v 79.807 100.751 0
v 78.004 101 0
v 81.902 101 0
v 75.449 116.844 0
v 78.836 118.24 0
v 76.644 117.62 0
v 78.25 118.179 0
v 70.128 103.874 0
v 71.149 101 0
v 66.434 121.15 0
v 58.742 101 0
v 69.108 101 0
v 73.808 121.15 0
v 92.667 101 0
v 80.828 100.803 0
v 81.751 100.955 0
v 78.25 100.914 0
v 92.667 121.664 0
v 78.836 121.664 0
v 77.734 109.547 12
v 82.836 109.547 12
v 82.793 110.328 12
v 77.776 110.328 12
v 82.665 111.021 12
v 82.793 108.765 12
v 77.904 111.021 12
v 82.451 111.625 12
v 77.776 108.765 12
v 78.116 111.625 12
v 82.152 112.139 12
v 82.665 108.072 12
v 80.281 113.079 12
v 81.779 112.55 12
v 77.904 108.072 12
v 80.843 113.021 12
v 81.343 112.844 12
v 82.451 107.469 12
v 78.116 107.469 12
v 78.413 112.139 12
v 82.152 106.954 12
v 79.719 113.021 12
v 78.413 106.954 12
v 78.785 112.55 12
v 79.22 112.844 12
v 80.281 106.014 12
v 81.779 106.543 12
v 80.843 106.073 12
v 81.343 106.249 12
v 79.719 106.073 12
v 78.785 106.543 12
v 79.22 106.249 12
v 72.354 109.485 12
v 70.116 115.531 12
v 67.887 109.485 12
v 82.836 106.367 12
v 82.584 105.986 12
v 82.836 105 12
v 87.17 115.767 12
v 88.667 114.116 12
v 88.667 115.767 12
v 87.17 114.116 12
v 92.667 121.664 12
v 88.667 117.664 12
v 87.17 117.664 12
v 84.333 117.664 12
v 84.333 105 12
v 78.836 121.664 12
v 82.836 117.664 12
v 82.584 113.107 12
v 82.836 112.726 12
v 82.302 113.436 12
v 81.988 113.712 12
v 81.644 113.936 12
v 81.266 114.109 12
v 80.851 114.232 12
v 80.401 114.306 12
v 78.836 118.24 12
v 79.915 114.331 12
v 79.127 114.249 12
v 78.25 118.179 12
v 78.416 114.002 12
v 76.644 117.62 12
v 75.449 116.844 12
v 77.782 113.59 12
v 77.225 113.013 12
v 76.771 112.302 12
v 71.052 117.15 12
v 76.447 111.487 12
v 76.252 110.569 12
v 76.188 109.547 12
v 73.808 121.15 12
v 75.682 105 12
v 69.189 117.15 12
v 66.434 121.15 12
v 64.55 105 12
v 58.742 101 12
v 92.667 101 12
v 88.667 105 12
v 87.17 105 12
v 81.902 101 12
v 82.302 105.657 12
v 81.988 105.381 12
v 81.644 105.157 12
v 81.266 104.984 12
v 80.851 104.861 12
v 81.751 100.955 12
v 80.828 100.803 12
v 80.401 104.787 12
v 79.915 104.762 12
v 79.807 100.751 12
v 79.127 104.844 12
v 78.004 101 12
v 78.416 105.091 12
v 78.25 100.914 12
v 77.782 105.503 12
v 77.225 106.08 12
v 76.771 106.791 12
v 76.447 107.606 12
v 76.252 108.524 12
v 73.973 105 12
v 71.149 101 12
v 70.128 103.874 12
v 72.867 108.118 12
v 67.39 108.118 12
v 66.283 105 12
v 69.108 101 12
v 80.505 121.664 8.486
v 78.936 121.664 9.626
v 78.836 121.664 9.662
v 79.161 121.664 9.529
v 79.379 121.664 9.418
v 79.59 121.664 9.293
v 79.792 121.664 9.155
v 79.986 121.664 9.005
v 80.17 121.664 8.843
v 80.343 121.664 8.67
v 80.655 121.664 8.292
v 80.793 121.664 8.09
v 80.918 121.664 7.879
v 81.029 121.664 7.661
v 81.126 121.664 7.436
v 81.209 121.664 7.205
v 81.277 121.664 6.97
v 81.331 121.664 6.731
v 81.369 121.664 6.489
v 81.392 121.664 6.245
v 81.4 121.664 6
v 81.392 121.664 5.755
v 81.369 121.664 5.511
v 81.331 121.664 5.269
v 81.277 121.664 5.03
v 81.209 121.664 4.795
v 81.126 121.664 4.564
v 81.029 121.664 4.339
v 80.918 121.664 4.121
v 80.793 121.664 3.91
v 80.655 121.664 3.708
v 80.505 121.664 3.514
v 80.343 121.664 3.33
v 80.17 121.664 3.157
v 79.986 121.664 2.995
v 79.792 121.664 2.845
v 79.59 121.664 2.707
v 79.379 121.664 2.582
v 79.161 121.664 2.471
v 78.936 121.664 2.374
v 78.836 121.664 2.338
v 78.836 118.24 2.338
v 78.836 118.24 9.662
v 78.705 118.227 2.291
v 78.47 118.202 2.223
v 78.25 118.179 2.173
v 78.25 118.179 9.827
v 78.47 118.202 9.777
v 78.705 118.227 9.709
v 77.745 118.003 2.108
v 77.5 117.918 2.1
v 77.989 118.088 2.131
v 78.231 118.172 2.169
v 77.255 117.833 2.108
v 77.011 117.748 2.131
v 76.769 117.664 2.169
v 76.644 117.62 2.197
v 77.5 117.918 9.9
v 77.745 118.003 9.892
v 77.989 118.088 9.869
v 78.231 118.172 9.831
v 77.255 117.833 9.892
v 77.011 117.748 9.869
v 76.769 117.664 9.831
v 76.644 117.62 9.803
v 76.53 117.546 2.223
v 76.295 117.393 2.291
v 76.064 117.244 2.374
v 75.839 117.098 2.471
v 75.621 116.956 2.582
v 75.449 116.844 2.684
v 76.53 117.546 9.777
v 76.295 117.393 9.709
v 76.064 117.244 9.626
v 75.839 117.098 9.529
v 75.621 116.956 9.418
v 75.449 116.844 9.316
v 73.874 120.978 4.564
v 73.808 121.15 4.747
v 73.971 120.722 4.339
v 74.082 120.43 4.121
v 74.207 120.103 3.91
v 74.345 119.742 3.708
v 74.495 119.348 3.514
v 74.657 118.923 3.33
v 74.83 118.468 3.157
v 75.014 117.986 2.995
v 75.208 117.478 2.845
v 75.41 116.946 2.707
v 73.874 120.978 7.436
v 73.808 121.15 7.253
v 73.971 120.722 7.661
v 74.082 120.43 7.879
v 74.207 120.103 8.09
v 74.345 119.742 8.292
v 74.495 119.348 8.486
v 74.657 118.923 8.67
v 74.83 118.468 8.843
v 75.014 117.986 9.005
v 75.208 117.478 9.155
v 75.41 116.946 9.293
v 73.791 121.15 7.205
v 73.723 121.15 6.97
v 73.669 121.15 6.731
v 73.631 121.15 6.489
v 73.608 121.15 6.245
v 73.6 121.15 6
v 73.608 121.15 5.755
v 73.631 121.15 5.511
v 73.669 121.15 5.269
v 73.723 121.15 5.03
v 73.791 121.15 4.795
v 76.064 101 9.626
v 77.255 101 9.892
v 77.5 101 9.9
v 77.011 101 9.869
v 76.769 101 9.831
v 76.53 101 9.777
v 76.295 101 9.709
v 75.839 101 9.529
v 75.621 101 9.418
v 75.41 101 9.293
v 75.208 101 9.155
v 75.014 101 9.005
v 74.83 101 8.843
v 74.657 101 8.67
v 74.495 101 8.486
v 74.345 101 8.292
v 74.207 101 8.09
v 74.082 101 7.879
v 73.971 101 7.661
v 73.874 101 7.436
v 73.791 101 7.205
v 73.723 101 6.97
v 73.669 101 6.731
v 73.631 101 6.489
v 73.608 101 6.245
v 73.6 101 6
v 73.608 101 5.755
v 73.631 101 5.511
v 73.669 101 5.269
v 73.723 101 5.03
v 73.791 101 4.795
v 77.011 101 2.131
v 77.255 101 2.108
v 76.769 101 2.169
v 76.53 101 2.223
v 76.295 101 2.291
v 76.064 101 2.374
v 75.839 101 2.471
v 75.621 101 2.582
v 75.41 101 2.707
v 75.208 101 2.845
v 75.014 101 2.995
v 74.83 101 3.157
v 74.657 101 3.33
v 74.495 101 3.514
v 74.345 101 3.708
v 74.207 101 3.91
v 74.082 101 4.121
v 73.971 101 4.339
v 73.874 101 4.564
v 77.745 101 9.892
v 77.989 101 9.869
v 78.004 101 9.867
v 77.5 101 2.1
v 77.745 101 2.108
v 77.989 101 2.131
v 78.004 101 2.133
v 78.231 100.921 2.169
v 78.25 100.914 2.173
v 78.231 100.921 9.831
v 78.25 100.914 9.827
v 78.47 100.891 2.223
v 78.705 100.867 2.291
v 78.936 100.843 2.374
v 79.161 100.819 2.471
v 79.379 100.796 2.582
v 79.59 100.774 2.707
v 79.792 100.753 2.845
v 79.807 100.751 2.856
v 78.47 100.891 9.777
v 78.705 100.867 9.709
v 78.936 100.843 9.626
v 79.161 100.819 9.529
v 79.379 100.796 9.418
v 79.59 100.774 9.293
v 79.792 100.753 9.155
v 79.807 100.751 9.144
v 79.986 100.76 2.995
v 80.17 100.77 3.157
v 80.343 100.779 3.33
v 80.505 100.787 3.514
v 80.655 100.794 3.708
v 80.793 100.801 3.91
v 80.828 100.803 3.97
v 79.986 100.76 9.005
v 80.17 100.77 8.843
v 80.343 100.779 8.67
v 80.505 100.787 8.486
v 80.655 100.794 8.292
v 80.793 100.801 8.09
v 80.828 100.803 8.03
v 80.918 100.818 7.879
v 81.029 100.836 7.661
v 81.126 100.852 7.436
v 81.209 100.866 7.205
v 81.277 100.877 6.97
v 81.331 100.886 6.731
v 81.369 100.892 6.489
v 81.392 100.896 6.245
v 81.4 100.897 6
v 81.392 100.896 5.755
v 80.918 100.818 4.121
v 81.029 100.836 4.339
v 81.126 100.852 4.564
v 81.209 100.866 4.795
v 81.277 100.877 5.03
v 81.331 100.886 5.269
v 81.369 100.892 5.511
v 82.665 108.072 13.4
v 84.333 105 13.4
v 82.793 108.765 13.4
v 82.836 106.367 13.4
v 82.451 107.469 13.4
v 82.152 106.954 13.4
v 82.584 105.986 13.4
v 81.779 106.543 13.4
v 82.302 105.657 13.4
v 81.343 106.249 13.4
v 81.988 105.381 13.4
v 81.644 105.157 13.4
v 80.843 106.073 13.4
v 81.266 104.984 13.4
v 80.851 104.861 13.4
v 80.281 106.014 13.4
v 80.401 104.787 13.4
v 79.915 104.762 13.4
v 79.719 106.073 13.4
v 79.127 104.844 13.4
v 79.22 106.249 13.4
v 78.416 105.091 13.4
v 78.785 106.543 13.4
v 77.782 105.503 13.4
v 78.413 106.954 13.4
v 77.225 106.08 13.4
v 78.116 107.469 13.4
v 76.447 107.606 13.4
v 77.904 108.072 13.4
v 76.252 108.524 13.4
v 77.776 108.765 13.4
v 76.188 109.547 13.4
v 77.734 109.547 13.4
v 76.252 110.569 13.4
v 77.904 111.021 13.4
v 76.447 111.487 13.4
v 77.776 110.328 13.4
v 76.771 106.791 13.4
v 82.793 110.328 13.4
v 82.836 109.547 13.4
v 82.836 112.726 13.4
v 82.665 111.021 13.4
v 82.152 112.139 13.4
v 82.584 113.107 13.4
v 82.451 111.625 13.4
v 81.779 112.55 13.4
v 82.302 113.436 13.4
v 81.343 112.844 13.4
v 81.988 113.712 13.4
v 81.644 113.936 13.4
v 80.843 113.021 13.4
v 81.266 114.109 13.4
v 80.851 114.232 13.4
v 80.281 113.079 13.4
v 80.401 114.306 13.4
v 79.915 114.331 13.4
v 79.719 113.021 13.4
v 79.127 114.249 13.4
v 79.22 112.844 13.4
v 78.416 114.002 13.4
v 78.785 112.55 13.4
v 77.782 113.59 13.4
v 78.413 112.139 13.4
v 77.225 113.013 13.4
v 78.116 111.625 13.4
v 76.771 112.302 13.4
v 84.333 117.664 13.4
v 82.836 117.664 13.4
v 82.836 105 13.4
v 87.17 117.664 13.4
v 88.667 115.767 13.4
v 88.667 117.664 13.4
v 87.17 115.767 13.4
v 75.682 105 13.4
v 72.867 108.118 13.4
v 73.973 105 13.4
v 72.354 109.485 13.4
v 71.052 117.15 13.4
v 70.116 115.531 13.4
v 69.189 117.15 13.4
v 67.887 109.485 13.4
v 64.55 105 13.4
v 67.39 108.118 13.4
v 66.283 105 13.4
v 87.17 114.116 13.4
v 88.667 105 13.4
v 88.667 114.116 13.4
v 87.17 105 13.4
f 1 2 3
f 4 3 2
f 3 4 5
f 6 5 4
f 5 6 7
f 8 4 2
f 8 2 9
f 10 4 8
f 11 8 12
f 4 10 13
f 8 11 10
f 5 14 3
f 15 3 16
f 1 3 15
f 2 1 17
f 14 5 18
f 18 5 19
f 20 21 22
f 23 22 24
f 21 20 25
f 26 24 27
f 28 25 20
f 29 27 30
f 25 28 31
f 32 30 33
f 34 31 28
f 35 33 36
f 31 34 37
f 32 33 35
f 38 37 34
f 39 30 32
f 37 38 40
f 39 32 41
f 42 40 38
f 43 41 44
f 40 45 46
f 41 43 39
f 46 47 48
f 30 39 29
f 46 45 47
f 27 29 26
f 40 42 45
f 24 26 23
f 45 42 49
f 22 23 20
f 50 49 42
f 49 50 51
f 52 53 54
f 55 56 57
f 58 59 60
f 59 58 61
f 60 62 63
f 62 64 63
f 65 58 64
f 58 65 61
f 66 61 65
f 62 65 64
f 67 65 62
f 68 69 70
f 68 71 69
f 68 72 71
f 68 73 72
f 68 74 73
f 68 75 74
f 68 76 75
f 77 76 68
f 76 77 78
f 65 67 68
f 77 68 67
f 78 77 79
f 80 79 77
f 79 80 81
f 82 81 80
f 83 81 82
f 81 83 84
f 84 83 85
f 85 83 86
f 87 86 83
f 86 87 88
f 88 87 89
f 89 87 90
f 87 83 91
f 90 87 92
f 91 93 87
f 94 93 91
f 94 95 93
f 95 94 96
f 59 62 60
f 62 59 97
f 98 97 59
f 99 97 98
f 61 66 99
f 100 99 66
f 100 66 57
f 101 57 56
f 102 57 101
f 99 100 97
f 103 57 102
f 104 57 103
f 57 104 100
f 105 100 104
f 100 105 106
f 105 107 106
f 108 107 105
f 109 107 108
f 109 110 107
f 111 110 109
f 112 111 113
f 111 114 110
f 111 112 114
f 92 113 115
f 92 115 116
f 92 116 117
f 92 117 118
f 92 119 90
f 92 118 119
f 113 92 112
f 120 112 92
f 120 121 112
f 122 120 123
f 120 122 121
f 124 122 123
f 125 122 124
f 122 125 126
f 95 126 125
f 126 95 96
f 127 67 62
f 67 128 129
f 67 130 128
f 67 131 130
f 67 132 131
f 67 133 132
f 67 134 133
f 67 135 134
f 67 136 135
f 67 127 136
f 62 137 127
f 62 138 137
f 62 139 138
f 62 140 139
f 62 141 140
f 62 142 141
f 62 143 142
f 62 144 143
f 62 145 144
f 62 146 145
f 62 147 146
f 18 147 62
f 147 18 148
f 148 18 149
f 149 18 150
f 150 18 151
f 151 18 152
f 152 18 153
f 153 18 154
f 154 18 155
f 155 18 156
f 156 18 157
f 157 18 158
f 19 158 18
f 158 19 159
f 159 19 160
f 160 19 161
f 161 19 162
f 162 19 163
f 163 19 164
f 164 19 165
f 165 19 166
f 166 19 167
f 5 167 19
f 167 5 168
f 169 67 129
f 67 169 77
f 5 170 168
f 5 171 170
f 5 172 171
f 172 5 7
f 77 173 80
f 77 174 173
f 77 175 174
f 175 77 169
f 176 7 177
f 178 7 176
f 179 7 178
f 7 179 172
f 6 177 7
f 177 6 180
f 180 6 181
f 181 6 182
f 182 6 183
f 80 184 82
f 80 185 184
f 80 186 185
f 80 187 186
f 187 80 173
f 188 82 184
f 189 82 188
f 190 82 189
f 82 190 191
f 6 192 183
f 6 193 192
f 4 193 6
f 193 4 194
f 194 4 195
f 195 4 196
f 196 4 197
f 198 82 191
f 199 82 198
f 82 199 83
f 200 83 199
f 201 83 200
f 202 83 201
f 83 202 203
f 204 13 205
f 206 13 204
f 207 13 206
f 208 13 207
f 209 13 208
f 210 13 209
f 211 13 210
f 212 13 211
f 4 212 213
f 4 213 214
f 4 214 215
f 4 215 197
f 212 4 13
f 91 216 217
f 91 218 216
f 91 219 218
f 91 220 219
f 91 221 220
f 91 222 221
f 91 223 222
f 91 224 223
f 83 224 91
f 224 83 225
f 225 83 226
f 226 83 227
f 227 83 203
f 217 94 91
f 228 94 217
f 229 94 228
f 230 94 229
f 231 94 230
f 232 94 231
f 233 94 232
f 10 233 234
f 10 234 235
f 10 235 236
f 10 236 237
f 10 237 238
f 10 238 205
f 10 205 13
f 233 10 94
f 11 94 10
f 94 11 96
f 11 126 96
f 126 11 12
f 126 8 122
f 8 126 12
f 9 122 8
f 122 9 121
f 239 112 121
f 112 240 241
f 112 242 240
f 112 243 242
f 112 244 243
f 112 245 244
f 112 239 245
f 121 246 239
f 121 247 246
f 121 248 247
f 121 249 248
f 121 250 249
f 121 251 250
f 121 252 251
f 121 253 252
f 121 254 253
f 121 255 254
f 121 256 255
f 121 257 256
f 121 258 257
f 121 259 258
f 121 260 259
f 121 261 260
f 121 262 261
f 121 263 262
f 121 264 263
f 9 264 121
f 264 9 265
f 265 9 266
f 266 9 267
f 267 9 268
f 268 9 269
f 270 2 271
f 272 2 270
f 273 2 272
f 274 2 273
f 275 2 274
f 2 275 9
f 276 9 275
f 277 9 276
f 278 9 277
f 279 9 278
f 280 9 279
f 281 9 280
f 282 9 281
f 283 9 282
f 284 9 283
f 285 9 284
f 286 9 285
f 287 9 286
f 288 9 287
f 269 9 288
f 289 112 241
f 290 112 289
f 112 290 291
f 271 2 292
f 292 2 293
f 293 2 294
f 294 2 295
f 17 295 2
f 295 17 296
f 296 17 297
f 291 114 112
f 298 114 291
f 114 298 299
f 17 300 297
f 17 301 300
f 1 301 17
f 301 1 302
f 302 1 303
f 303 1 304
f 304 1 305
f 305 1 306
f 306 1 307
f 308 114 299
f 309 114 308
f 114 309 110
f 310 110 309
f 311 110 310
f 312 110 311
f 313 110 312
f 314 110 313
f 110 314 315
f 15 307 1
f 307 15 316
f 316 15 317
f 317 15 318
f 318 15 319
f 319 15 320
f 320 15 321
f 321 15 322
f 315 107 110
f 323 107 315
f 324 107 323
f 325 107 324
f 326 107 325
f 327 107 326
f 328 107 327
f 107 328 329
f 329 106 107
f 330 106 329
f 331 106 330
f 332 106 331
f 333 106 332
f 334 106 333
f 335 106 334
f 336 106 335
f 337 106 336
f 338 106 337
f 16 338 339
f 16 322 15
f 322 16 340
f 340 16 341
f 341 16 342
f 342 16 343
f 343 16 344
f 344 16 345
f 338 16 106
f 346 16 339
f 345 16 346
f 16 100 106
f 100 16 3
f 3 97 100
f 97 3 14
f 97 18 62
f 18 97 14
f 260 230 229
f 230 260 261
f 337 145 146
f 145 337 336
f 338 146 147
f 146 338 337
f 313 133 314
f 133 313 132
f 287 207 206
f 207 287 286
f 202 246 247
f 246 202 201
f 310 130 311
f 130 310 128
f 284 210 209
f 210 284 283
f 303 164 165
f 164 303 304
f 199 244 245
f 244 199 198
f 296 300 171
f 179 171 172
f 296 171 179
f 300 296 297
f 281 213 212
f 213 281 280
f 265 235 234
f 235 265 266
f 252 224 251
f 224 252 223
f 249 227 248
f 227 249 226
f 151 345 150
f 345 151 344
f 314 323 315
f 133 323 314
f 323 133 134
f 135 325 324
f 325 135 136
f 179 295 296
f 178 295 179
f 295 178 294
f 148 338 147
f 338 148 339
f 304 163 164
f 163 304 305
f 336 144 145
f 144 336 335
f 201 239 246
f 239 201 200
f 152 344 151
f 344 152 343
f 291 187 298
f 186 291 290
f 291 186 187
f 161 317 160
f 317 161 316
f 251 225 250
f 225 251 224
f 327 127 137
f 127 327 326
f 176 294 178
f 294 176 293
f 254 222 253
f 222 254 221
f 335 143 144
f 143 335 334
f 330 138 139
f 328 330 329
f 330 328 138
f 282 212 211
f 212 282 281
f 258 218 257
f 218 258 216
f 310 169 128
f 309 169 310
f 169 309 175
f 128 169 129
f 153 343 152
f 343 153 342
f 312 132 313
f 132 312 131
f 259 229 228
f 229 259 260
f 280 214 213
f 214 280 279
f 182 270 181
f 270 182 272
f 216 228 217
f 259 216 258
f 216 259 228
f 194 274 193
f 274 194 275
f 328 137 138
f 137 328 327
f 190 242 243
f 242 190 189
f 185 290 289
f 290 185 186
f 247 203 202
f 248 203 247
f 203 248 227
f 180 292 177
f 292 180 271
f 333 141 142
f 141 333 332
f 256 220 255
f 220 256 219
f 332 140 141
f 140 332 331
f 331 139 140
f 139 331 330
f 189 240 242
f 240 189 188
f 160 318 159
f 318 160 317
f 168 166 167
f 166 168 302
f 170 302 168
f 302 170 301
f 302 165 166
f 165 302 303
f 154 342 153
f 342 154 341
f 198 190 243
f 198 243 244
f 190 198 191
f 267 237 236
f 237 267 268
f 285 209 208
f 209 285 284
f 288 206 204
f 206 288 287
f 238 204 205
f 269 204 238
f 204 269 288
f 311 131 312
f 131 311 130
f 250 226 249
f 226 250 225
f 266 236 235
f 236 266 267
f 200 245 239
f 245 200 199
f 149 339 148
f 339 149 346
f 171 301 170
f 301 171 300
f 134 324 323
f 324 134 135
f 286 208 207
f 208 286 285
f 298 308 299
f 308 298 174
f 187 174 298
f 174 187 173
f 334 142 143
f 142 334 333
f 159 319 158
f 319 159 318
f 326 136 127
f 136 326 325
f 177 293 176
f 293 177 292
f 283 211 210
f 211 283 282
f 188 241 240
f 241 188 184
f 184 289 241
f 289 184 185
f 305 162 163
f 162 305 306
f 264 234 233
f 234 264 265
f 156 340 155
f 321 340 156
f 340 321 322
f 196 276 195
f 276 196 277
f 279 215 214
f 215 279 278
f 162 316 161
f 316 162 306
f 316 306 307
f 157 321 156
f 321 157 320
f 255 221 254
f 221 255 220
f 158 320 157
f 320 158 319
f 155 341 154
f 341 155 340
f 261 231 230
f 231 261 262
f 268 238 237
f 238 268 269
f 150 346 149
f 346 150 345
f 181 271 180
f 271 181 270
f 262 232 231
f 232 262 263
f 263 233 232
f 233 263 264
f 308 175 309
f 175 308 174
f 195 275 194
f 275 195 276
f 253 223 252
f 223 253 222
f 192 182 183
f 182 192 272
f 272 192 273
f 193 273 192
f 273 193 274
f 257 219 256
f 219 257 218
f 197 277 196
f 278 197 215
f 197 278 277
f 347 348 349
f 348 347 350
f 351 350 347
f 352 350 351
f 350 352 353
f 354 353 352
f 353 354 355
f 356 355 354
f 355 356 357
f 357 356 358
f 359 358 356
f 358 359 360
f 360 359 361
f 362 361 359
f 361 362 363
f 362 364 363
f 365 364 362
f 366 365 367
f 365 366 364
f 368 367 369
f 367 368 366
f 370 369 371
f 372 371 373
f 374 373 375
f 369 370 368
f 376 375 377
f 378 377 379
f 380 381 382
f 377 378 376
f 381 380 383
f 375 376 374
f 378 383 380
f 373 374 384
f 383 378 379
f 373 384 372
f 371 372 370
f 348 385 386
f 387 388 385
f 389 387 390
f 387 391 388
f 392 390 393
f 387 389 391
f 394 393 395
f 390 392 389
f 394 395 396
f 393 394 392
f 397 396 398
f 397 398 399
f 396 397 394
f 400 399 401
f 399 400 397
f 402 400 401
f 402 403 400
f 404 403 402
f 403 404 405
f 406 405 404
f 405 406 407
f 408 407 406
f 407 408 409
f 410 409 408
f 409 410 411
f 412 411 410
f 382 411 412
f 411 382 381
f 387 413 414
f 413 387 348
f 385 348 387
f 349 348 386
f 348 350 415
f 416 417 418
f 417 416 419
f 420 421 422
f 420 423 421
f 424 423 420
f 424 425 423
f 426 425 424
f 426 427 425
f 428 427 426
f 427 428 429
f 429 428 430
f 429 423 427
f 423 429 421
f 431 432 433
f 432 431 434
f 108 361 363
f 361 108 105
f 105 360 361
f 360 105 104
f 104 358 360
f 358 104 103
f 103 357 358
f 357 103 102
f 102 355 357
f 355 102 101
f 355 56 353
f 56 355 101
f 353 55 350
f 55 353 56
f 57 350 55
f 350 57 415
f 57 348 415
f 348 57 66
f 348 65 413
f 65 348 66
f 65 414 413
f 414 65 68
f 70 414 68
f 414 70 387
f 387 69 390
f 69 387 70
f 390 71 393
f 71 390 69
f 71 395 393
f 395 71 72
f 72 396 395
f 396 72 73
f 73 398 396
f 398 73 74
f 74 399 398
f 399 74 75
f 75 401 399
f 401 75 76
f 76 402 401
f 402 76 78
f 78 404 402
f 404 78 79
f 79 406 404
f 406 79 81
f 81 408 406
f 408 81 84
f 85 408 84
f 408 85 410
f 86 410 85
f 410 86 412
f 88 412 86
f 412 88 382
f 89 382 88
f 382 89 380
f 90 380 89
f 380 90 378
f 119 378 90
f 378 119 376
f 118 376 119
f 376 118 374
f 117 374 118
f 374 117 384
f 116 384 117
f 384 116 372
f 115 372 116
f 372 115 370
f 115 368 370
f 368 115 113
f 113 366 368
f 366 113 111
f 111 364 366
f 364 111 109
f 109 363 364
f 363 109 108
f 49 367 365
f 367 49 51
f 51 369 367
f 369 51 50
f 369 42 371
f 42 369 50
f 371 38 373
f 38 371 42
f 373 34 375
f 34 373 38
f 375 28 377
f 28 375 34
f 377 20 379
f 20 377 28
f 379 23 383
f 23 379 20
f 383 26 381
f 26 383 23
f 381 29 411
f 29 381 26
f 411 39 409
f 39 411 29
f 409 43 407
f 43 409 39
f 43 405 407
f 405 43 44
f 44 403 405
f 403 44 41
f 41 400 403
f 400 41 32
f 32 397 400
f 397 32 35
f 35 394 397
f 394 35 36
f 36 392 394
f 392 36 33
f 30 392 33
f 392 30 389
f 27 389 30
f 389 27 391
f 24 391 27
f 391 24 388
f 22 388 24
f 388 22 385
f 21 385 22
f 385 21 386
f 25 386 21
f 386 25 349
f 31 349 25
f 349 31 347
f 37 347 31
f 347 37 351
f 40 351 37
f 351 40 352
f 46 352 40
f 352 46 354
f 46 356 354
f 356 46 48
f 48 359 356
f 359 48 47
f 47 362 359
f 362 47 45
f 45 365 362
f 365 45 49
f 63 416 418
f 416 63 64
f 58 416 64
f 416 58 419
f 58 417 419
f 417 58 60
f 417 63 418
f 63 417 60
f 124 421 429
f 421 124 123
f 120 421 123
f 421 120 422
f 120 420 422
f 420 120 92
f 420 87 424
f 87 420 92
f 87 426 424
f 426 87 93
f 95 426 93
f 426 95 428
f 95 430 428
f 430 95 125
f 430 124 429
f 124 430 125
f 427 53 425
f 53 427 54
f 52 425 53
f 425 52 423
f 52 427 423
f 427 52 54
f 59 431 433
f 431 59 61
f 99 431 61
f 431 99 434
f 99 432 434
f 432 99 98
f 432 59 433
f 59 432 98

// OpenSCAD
/* =====================================================
   Multi-Name Topper (FIX PERFECT CENTER)
   ===================================================== */

grid_cols = 2;
/* [Nama] */
/* [Nama] */
nama_1  = "Adi";
nama_1_icon = "None"; // ["None", "Anchor", "Heart", "Star", "Crown", "Paw", "Music", "Cat", "Moon", "Sun", "Flower", "Diamond", "Butterfly", "Ribbon", "Smile"]

nama_2  = "";
nama_2_icon = "None"; // ["None", "Anchor", "Heart", "Star", "Crown", "Paw", "Music", "Cat", "Moon", "Sun", "Flower", "Diamond", "Butterfly", "Ribbon", "Smile"]

nama_3  = "";
nama_3_icon = "None"; // ["None", "Anchor", "Heart", "Star", "Crown", "Paw", "Music", "Cat", "Moon", "Sun", "Flower", "Diamond", "Butterfly", "Ribbon", "Smile"]

nama_4  = "";
nama_4_icon = "None"; // ["None", "Anchor", "Heart", "Star", "Crown", "Paw", "Music", "Cat", "Moon", "Sun", "Flower", "Diamond", "Butterfly", "Ribbon", "Smile"]

nama_5  = "";
nama_5_icon = "None"; // ["None", "Anchor", "Heart", "Star", "Crown", "Paw", "Music", "Cat", "Moon", "Sun", "Flower", "Diamond", "Butterfly", "Ribbon", "Smile"]

nama_6  = "";
nama_6_icon = "None"; // ["None", "Anchor", "Heart", "Star", "Crown", "Paw", "Music", "Cat", "Moon", "Sun", "Flower", "Diamond", "Butterfly", "Ribbon", "Smile"]

nama_7  = "";
nama_7_icon = "None"; // ["None", "Anchor", "Heart", "Star", "Crown", "Paw", "Music", "Cat", "Moon", "Sun", "Flower", "Diamond", "Butterfly", "Ribbon", "Smile"]

nama_8  = "";
nama_8_icon = "None"; // ["None", "Anchor", "Heart", "Star", "Crown", "Paw", "Music", "Cat", "Moon", "Sun", "Flower", "Diamond", "Butterfly", "Ribbon", "Smile"]

nama_9  = "";
nama_9_icon = "None"; // ["None", "Anchor", "Heart", "Star", "Crown", "Paw", "Music", "Cat", "Moon", "Sun", "Flower", "Diamond", "Butterfly", "Ribbon", "Smile"]

nama_10 = "";
nama_10_icon = "None"; // ["None", "Anchor", "Heart", "Star", "Crown", "Paw", "Music", "Cat", "Moon", "Sun", "Flower", "Diamond", "Butterfly", "Ribbon", "Smile"]

/* [Warna] */ 
base_color_name = "Peak Green"; // [Yellow, White, Sky Blue, Red, Peak Green, Orange, Grape Purple, Black, Beige, Barbie Pink] 
letters_color_name = "White"; // [Yellow, White, Sky Blue, Red, Peak Green, Orange, Grape Purple, Black, Beige, Barbie Pink]

/* [Settings] */
font_name        = "Bagel Fat One"; // font [Bagel Fat One, Chewy, Courgette, Dancing Script, Lemon, Lobster, Pacifico, Playfair, Lily Script One, Sacramento, Bubblegum Sans, DynaPuff, Alkatra, Archivo, Sour Gummy, Shrikhand]
letter_height    = 12;
letter_thickness = 1.4;
base_height      = 12;
outline_margin   = 4;

hole_orientation = "TOPBOTTOM";
hole_diameter    = 7.8;
hole_length      = 200;

hole_y = 4;
hole_z = base_height / 2;

/* [Layout Grid] */
bed_x = 235;
bed_y = 235;

gap_x = 10;
gap_y = 10;

slot_w = 70;
slot_h = 25;

/* ===============================
   COLOR
   =============================== */
function getColor(name) =
    name == "Yellow"       ? "#FFD700" :
    name == "White"        ? "#FFFFFF" :
    name == "Sky Blue"     ? "#87CEEB" :
    name == "Red"          ? "#FF0000" :
    name == "Peak Green"   ? "#00C853" :
    name == "Orange"       ? "#FF6A00" :
    name == "Grape Purple" ? "#6A0DAD" :
    name == "Black"        ? "#000000" :
    name == "Beige"        ? "#D9B99b" :
    name == "Barbie Pink"  ? "#FF69B4" :
    "#FFFFFF";

base_color    = getColor(base_color_name);
letters_color = getColor(letters_color_name);

// ─────────────────────────────────────────────
// VECTOR 2D ICONS (100% CGAL Safe untuk MakerWorld)
// ─────────────────────────────────────────────
module icon_anchor(h = 10) {
    s = h / 12;
    scale([s, s]) {
        translate([0, 1]) {
            difference() {
                translate([0, 9.5]) circle(r = 2.2, $fn=24);
                translate([0, 9.5]) circle(r = 1.0, $fn=24);
            }
            translate([-0.8, 1]) square([1.6, 7.5]);
            translate([-3, 6]) square([6, 1.3]);
            difference() {
                translate([0, 3.5]) circle(r = 4.5, $fn=24);
                translate([0, 3.5]) circle(r = 2.9, $fn=24);
                translate([-6, 3.5]) square([12, 6]);
            }
            hull() {
                translate([-4.5, 3.5]) circle(r = 0.8, $fn=16);
                translate([-5.5, 5.2]) circle(r = 0.3, $fn=16);
                translate([-3.2, 3.5]) circle(r = 0.8, $fn=16);
            }
            hull() {
                translate([4.5, 3.5]) circle(r = 0.8, $fn=16);
                translate([5.5, 5.2]) circle(r = 0.3, $fn=16);
                translate([3.2, 3.5]) circle(r = 0.8, $fn=16);
            }
        }
    }
}

module icon_heart(h = 10) {
    s = h / 9.5;
    scale([s, s]) {
        translate([0, 0.5]) {
            hull() {
                translate([-2.5, 6.5]) circle(r = 2.5, $fn=24);
                translate([0, 1.2]) circle(r = 0.6, $fn=16);
            }
            hull() {
                translate([2.5, 6.5]) circle(r = 2.5, $fn=24);
                translate([0, 1.2]) circle(r = 0.6, $fn=16);
            }
        }
    }
}

module icon_star(h = 10) {
    r_out = h / 2;
    r_in  = r_out * 0.42;
    translate([0, r_out]) {
        for (i = [0:4]) {
            hull() {
                circle(r = r_in, $fn=16);
                rotate([0, 0, i * 72 + 90]) translate([r_out, 0]) circle(r = 0.5, $fn=12);
            }
        }
    }
}

module icon_crown(h = 10) {
    s = h / 10;
    scale([s, s]) {
        translate([0, 0.5]) {
            hull() {
                translate([-4.5, 0]) square([9, 1.5]);
                translate([0, 7.5]) circle(r = 0.8, $fn=16);
            }
            hull() {
                translate([-4.5, 0]) square([9, 1.5]);
                translate([-4.2, 6.5]) circle(r = 0.8, $fn=16);
            }
            hull() {
                translate([-4.5, 0]) square([9, 1.5]);
                translate([4.2, 6.5]) circle(r = 0.8, $fn=16);
            }
        }
    }
}

module icon_paw(h = 10) {
    s = h / 12;
    scale([s, s]) {
        translate([0, 1]) {
            hull() {
                translate([0, 3.5]) circle(r = 2.8, $fn=24);
                translate([-2, 2]) circle(r = 1.6, $fn=20);
                translate([2, 2]) circle(r = 1.6, $fn=20);
            }
            translate([-3.3, 7.5]) circle(r = 1.0, $fn=16);
            translate([-1.3, 9.2]) circle(r = 1.1, $fn=16);
            translate([1.3, 9.2]) circle(r = 1.1, $fn=16);
            translate([3.3, 7.5]) circle(r = 1.0, $fn=16);
        }
    }
}

module icon_music(h = 10) {
    s = h / 12;
    scale([s, s]) {
        translate([0, 1]) {
            rotate([0, 0, -20]) translate([-2.5, 2]) scale([1.3, 0.9]) circle(r = 1.6, $fn=20);
            rotate([0, 0, -20]) translate([1.8, 4]) scale([1.3, 0.9]) circle(r = 1.6, $fn=20);
            translate([-1.5, 2]) square([1.0, 7.5]);
            translate([2.8, 4]) square([1.0, 7.5]);
            hull() {
                translate([-1.5, 8.5]) square([5.3, 1.2]);
                translate([-1.5, 7.5]) square([5.3, 0.5]);
            }
        }
    }
}

module icon_cat(h = 10) {
    s = h / 12;
    scale([s, s]) {
        translate([0, 1]) {
            translate([0, 4.5]) circle(r = 3.8, $fn=24);
            hull() {
                translate([-3.2, 6]) circle(r = 1.0, $fn=16);
                translate([-3.5, 9.2]) circle(r = 0.3, $fn=12);
                translate([-1.2, 7.2]) circle(r = 0.8, $fn=16);
            }
            hull() {
                translate([3.2, 6]) circle(r = 1.0, $fn=16);
                translate([3.5, 9.2]) circle(r = 0.3, $fn=12);
                translate([1.2, 7.2]) circle(r = 0.8, $fn=16);
            }
        }
    }
}

module icon_moon(h = 10) {
    s = h / 12;
    scale([s, s]) {
        translate([0, 1]) {
            difference() {
                translate([0, 5]) circle(r = 4.5, $fn=32);
                translate([2.2, 5.5]) circle(r = 4.0, $fn=32);
            }
        }
    }
}

module icon_sun(h = 10) {
    s = h / 12;
    scale([s, s]) {
        translate([0, 6]) {
            circle(r = 2.5, $fn=24);
            for (a = [0:45:315]) {
                rotate([0, 0, a])
                    hull() {
                        translate([3.2, 0]) circle(r = 0.5, $fn=12);
                        translate([4.6, 0]) circle(r = 0.2, $fn=8);
                    }
            }
        }
    }
}

module icon_flower(h = 10) {
    s = h / 12;
    scale([s, s]) {
        translate([0, 6]) {
            circle(r = 1.5, $fn=20);
            for (a = [0:72:288]) {
                rotate([0, 0, a])
                    translate([2.5, 0]) circle(r = 1.6, $fn=20);
            }
        }
    }
}

module icon_diamond(h = 10) {
    s = h / 12;
    scale([s, s]) {
        translate([0, 1]) {
            hull() {
                translate([-4, 6]) square([8, 2]);
                translate([0, 0.5]) circle(r = 0.5, $fn=16);
            }
            hull() {
                translate([-4, 6]) square([8, 2]);
                translate([-2.5, 9.5]) square([5, 0.5]);
            }
        }
    }
}

module icon_butterfly(h = 10) {
    s = h / 12;
    scale([s, s]) {
        translate([0, 1]) {
            hull() {
                translate([0, 7]) circle(r = 0.8, $fn=16);
                translate([0, 2]) circle(r = 0.5, $fn=16);
            }
            hull() {
                translate([-2.8, 6.8]) circle(r = 2.2, $fn=20);
                translate([0, 5]) circle(r = 0.8, $fn=16);
            }
            hull() {
                translate([2.8, 6.8]) circle(r = 2.2, $fn=20);
                translate([0, 5]) circle(r = 0.8, $fn=16);
            }
            hull() {
                translate([-2.2, 3.2]) circle(r = 1.6, $fn=20);
                translate([0, 4]) circle(r = 0.6, $fn=16);
            }
            hull() {
                translate([2.2, 3.2]) circle(r = 1.6, $fn=20);
                translate([0, 4]) circle(r = 0.6, $fn=16);
            }
        }
    }
}

module icon_ribbon(h = 10) {
    s = h / 12;
    scale([s, s]) {
        translate([0, 1]) {
            translate([0, 5.5]) circle(r = 1.2, $fn=20);
            hull() {
                translate([0, 5.5]) circle(r = 0.8, $fn=16);
                translate([-3.8, 6.8]) circle(r = 1.8, $fn=20);
                translate([-3.8, 4.2]) circle(r = 1.6, $fn=20);
            }
            hull() {
                translate([0, 5.5]) circle(r = 0.8, $fn=16);
                translate([3.8, 6.8]) circle(r = 1.8, $fn=20);
                translate([3.8, 4.2]) circle(r = 1.6, $fn=20);
            }
            hull() {
                translate([0, 5]) circle(r = 0.6, $fn=12);
                translate([-2.8, 1.2]) circle(r = 0.6, $fn=12);
            }
            hull() {
                translate([0, 5]) circle(r = 0.6, $fn=12);
                translate([2.8, 1.2]) circle(r = 0.6, $fn=12);
            }
        }
    }
}

module icon_smile(h = 10) {
    s = h / 12;
    scale([s, s]) {
        translate([0, 1]) {
            difference() {
                translate([0, 5]) circle(r = 4.5, $fn=32);
                translate([0, 5]) circle(r = 3.2, $fn=32);
            }
            translate([-1.8, 6.2]) circle(r = 0.7, $fn=16);
            translate([1.8, 6.2]) circle(r = 0.7, $fn=16);
            difference() {
                translate([0, 4.8]) circle(r = 2.2, $fn=24);
                translate([0, 4.8]) circle(r = 1.4, $fn=24);
                translate([-3, 4.8]) square([6, 3]);
            }
        }
    }
}

module draw_icon(name, size = 10) {
    if (name == "Anchor") {
        translate([size * 0.4, 0, 0]) icon_anchor(size);
    } else if (name == "Heart") {
        translate([size * 0.44, 0, 0]) icon_heart(size);
    } else if (name == "Star") {
        translate([size * 0.4, 0, 0]) icon_star(size);
    } else if (name == "Crown") {
        translate([size * 0.4, 0, 0]) icon_crown(size);
    } else if (name == "Paw") {
        translate([size * 0.4, 0, 0]) icon_paw(size);
    } else if (name == "Music") {
        translate([size * 0.4, 0, 0]) icon_music(size);
    } else if (name == "Cat") {
        translate([size * 0.4, 0, 0]) icon_cat(size);
    } else if (name == "Moon") {
        translate([size * 0.4, 0, 0]) icon_moon(size);
    } else if (name == "Sun") {
        translate([size * 0.4, 0, 0]) icon_sun(size);
    } else if (name == "Flower") {
        translate([size * 0.4, 0, 0]) icon_flower(size);
    } else if (name == "Diamond") {
        translate([size * 0.4, 0, 0]) icon_diamond(size);
    } else if (name == "Butterfly") {
        translate([size * 0.4, 0, 0]) icon_butterfly(size);
    } else if (name == "Ribbon") {
        translate([size * 0.4, 0, 0]) icon_ribbon(size);
    } else if (name == "Smile") {
        translate([size * 0.4, 0, 0]) icon_smile(size);
    }
}

// ─────────────────────────────────────────────
// EMOJI CLEANER & AUTO DETECT
// ─────────────────────────────────────────────
function is_printable_ascii(c) = (ord(c) >= 32 && ord(c) <= 126) || ord(c) == 194 || ord(c) == 176 || ord(c) == 177;

function str_join(arr, idx=0) = 
    idx >= len(arr) ? "" :
    str(arr[idx], str_join(arr, idx+1));

function clean_text(str_val) = 
    len(str_val) == 0 ? "" :
    str_join([for (i = [0:len(str_val)-1]) if (is_printable_ascii(str_val[i])) str_val[i]]);

function has_emoji_or_symbol(str_val) =
    len(str_val) == 0 ? false :
    len([for (i = [0:len(str_val)-1]) if (!is_printable_ascii(str_val[i])) 1]) > 0;

function resolve_icon(word, select_icon) =
    select_icon != "None" ? select_icon :
    has_emoji_or_symbol(word) ? "Anchor" :
    "None";

function char_w_val(c) =
    c=="A" ? 0.96 : c=="B" ? 0.80 : c=="C" ? 0.84 :
    c=="D" ? 0.84 : c=="E" ? 0.86 : c=="F" ? 0.76 :
    c=="G" ? 0.96 : c=="H" ? 0.93 : c=="I" ? 0.4  :
    c=="J" ? 0.76 : c=="K" ? 0.92 : c=="L" ? 0.74 :
    c=="M" ? 1.20 : c=="N" ? 0.98 : c=="O" ? 0.90 :
    c=="P" ? 0.88 : c=="Q" ? 0.90 : c=="R" ? 0.92 :
    c=="S" ? 0.90 : c=="T" ? 0.74 : c=="U" ? 0.86 :
    c=="V" ? 0.84 : c=="W" ? 1.14 : c=="X" ? 0.80 :
    c=="Y" ? 0.78 : c=="Z" ? 0.78 :
    c=="a" ? 0.85 : c=="b" ? 0.79 : c=="c" ? 0.74 :
    c=="d" ? 0.84 : c=="e" ? 0.76 : c=="f" ? 0.54 :
    c=="g" ? 0.76 : c=="h" ? 0.78 : c=="i" ? 0.38 :
    c=="j" ? 0.44 : c=="k" ? 0.84 : c=="l" ? 0.38 :
    c=="m" ? 1.08 : c=="n" ? 0.78 : c=="o" ? 0.78 :
    c=="p" ? 0.76 : c=="q" ? 0.86 : c=="r" ? 0.70 :
    c=="s" ? 0.76 : c=="t" ? 0.70 : c=="u" ? 0.84 :
    c=="v" ? 0.74 : c=="w" ? 1.14 : c=="x" ? 0.70 :
    c=="y" ? 0.74 : c=="z" ? 0.80 :
    c=="." ? 0.10 : ord(c)==194 ? 0.18 : ord(c)==176 ? 0.18 :
    c==" " ? 0.50 : 0.76;

function sum_char_w(str_val, idx=0) =
    idx >= len(str_val) ? 0 :
    char_w_val(str_val[idx]) + sum_char_w(str_val, idx+1);

function get_raw_word_width(word) =
    let(cleaned = clean_text(word))
    sum_char_w(cleaned) * letter_height;

module render_text_and_icon(text_string, icon_name = "None") {
    effective_icon = resolve_icon(text_string, icon_name);
    cleaned = clean_text(text_string);
    word_w  = get_raw_word_width(text_string);
    icon_w  = (effective_icon != "None") ? letter_height * 0.9 : 0;
    total_w = word_w + (icon_w > 0 ? icon_w + 2 : 0);

    translate([-total_w / 2, 0, 0]) {
        if (cleaned != "") {
            text(
                cleaned,
                size   = letter_height,
                font   = font_name,
                valign = "baseline"
            );
        }
        if (effective_icon != "None") {
            translate([word_w, 0, 0])
                draw_icon(effective_icon, size = letter_height * 0.9);
        }
    }
}

/* ===============================
   MODULES (CENTER FIX)
   =============================== */
module base_with_tunnel(text_string, icon_name = "None") {

    difference() {
        linear_extrude(height = base_height)
            offset(delta = outline_margin)
                render_text_and_icon(text_string, icon_name);

        if (hole_orientation == "TOPBOTTOM") {
            translate([ 0, 0, hole_z ])
                rotate([ 90, 0, 0 ])
                    cylinder(d = hole_diameter, h = hole_length, center = true, $fn = 100);
        }
        else if (hole_orientation == "FRONTBACK") {
            translate([ 0, hole_y, hole_z ])
                rotate([ 0, 90, 0 ])
                    cylinder(d = hole_diameter, h = hole_length, center = true, $fn = 100);
        }
    }
}

module raised_letters(text_string, icon_name = "None") {
    translate([ 0, 0, base_height ])
        linear_extrude(height = letter_thickness)
            render_text_and_icon(text_string, icon_name);
}

module name_topper(text_string, icon_name = "None") {
    color(base_color)    base_with_tunnel(text_string, icon_name);
    color(letters_color) raised_letters(text_string, icon_name);
}

/* ===============================
   GENERATE GRID
   =============================== */
nama_all = [
    nama_1, nama_2, nama_3, nama_4, nama_5,
    nama_6, nama_7, nama_8, nama_9, nama_10
];

icon_all = [
    nama_1_icon, nama_2_icon, nama_3_icon, nama_4_icon, nama_5_icon,
    nama_6_icon, nama_7_icon, nama_8_icon, nama_9_icon, nama_10_icon
];

active_indices = [for (i = [0:9]) if (nama_all[i] != "") i];
total          = len(active_indices);

grid_rows = ceil(total / grid_cols);

total_w = grid_cols * slot_w + (grid_cols - 1) * gap_x;
total_h = grid_rows * slot_h + (grid_rows - 1) * gap_y;

start_x = (bed_x - total_w) / 2;
start_y = (bed_y - total_h) / 2;

/* ===============================
   LOOP RENDER
   =============================== */
if (total > 0) {
    for (idx = [0 : total - 1]) {
        i   = active_indices[idx];
        col = idx % grid_cols;
        row = floor(idx / grid_cols);

        x = start_x + col * (slot_w + gap_x) + slot_w / 2;
        y = start_y + (grid_rows - 1 - row) * (slot_h + gap_y);

        translate([ x, y, 0 ])
            name_topper(nama_all[i], icon_all[i]);
    }
}
